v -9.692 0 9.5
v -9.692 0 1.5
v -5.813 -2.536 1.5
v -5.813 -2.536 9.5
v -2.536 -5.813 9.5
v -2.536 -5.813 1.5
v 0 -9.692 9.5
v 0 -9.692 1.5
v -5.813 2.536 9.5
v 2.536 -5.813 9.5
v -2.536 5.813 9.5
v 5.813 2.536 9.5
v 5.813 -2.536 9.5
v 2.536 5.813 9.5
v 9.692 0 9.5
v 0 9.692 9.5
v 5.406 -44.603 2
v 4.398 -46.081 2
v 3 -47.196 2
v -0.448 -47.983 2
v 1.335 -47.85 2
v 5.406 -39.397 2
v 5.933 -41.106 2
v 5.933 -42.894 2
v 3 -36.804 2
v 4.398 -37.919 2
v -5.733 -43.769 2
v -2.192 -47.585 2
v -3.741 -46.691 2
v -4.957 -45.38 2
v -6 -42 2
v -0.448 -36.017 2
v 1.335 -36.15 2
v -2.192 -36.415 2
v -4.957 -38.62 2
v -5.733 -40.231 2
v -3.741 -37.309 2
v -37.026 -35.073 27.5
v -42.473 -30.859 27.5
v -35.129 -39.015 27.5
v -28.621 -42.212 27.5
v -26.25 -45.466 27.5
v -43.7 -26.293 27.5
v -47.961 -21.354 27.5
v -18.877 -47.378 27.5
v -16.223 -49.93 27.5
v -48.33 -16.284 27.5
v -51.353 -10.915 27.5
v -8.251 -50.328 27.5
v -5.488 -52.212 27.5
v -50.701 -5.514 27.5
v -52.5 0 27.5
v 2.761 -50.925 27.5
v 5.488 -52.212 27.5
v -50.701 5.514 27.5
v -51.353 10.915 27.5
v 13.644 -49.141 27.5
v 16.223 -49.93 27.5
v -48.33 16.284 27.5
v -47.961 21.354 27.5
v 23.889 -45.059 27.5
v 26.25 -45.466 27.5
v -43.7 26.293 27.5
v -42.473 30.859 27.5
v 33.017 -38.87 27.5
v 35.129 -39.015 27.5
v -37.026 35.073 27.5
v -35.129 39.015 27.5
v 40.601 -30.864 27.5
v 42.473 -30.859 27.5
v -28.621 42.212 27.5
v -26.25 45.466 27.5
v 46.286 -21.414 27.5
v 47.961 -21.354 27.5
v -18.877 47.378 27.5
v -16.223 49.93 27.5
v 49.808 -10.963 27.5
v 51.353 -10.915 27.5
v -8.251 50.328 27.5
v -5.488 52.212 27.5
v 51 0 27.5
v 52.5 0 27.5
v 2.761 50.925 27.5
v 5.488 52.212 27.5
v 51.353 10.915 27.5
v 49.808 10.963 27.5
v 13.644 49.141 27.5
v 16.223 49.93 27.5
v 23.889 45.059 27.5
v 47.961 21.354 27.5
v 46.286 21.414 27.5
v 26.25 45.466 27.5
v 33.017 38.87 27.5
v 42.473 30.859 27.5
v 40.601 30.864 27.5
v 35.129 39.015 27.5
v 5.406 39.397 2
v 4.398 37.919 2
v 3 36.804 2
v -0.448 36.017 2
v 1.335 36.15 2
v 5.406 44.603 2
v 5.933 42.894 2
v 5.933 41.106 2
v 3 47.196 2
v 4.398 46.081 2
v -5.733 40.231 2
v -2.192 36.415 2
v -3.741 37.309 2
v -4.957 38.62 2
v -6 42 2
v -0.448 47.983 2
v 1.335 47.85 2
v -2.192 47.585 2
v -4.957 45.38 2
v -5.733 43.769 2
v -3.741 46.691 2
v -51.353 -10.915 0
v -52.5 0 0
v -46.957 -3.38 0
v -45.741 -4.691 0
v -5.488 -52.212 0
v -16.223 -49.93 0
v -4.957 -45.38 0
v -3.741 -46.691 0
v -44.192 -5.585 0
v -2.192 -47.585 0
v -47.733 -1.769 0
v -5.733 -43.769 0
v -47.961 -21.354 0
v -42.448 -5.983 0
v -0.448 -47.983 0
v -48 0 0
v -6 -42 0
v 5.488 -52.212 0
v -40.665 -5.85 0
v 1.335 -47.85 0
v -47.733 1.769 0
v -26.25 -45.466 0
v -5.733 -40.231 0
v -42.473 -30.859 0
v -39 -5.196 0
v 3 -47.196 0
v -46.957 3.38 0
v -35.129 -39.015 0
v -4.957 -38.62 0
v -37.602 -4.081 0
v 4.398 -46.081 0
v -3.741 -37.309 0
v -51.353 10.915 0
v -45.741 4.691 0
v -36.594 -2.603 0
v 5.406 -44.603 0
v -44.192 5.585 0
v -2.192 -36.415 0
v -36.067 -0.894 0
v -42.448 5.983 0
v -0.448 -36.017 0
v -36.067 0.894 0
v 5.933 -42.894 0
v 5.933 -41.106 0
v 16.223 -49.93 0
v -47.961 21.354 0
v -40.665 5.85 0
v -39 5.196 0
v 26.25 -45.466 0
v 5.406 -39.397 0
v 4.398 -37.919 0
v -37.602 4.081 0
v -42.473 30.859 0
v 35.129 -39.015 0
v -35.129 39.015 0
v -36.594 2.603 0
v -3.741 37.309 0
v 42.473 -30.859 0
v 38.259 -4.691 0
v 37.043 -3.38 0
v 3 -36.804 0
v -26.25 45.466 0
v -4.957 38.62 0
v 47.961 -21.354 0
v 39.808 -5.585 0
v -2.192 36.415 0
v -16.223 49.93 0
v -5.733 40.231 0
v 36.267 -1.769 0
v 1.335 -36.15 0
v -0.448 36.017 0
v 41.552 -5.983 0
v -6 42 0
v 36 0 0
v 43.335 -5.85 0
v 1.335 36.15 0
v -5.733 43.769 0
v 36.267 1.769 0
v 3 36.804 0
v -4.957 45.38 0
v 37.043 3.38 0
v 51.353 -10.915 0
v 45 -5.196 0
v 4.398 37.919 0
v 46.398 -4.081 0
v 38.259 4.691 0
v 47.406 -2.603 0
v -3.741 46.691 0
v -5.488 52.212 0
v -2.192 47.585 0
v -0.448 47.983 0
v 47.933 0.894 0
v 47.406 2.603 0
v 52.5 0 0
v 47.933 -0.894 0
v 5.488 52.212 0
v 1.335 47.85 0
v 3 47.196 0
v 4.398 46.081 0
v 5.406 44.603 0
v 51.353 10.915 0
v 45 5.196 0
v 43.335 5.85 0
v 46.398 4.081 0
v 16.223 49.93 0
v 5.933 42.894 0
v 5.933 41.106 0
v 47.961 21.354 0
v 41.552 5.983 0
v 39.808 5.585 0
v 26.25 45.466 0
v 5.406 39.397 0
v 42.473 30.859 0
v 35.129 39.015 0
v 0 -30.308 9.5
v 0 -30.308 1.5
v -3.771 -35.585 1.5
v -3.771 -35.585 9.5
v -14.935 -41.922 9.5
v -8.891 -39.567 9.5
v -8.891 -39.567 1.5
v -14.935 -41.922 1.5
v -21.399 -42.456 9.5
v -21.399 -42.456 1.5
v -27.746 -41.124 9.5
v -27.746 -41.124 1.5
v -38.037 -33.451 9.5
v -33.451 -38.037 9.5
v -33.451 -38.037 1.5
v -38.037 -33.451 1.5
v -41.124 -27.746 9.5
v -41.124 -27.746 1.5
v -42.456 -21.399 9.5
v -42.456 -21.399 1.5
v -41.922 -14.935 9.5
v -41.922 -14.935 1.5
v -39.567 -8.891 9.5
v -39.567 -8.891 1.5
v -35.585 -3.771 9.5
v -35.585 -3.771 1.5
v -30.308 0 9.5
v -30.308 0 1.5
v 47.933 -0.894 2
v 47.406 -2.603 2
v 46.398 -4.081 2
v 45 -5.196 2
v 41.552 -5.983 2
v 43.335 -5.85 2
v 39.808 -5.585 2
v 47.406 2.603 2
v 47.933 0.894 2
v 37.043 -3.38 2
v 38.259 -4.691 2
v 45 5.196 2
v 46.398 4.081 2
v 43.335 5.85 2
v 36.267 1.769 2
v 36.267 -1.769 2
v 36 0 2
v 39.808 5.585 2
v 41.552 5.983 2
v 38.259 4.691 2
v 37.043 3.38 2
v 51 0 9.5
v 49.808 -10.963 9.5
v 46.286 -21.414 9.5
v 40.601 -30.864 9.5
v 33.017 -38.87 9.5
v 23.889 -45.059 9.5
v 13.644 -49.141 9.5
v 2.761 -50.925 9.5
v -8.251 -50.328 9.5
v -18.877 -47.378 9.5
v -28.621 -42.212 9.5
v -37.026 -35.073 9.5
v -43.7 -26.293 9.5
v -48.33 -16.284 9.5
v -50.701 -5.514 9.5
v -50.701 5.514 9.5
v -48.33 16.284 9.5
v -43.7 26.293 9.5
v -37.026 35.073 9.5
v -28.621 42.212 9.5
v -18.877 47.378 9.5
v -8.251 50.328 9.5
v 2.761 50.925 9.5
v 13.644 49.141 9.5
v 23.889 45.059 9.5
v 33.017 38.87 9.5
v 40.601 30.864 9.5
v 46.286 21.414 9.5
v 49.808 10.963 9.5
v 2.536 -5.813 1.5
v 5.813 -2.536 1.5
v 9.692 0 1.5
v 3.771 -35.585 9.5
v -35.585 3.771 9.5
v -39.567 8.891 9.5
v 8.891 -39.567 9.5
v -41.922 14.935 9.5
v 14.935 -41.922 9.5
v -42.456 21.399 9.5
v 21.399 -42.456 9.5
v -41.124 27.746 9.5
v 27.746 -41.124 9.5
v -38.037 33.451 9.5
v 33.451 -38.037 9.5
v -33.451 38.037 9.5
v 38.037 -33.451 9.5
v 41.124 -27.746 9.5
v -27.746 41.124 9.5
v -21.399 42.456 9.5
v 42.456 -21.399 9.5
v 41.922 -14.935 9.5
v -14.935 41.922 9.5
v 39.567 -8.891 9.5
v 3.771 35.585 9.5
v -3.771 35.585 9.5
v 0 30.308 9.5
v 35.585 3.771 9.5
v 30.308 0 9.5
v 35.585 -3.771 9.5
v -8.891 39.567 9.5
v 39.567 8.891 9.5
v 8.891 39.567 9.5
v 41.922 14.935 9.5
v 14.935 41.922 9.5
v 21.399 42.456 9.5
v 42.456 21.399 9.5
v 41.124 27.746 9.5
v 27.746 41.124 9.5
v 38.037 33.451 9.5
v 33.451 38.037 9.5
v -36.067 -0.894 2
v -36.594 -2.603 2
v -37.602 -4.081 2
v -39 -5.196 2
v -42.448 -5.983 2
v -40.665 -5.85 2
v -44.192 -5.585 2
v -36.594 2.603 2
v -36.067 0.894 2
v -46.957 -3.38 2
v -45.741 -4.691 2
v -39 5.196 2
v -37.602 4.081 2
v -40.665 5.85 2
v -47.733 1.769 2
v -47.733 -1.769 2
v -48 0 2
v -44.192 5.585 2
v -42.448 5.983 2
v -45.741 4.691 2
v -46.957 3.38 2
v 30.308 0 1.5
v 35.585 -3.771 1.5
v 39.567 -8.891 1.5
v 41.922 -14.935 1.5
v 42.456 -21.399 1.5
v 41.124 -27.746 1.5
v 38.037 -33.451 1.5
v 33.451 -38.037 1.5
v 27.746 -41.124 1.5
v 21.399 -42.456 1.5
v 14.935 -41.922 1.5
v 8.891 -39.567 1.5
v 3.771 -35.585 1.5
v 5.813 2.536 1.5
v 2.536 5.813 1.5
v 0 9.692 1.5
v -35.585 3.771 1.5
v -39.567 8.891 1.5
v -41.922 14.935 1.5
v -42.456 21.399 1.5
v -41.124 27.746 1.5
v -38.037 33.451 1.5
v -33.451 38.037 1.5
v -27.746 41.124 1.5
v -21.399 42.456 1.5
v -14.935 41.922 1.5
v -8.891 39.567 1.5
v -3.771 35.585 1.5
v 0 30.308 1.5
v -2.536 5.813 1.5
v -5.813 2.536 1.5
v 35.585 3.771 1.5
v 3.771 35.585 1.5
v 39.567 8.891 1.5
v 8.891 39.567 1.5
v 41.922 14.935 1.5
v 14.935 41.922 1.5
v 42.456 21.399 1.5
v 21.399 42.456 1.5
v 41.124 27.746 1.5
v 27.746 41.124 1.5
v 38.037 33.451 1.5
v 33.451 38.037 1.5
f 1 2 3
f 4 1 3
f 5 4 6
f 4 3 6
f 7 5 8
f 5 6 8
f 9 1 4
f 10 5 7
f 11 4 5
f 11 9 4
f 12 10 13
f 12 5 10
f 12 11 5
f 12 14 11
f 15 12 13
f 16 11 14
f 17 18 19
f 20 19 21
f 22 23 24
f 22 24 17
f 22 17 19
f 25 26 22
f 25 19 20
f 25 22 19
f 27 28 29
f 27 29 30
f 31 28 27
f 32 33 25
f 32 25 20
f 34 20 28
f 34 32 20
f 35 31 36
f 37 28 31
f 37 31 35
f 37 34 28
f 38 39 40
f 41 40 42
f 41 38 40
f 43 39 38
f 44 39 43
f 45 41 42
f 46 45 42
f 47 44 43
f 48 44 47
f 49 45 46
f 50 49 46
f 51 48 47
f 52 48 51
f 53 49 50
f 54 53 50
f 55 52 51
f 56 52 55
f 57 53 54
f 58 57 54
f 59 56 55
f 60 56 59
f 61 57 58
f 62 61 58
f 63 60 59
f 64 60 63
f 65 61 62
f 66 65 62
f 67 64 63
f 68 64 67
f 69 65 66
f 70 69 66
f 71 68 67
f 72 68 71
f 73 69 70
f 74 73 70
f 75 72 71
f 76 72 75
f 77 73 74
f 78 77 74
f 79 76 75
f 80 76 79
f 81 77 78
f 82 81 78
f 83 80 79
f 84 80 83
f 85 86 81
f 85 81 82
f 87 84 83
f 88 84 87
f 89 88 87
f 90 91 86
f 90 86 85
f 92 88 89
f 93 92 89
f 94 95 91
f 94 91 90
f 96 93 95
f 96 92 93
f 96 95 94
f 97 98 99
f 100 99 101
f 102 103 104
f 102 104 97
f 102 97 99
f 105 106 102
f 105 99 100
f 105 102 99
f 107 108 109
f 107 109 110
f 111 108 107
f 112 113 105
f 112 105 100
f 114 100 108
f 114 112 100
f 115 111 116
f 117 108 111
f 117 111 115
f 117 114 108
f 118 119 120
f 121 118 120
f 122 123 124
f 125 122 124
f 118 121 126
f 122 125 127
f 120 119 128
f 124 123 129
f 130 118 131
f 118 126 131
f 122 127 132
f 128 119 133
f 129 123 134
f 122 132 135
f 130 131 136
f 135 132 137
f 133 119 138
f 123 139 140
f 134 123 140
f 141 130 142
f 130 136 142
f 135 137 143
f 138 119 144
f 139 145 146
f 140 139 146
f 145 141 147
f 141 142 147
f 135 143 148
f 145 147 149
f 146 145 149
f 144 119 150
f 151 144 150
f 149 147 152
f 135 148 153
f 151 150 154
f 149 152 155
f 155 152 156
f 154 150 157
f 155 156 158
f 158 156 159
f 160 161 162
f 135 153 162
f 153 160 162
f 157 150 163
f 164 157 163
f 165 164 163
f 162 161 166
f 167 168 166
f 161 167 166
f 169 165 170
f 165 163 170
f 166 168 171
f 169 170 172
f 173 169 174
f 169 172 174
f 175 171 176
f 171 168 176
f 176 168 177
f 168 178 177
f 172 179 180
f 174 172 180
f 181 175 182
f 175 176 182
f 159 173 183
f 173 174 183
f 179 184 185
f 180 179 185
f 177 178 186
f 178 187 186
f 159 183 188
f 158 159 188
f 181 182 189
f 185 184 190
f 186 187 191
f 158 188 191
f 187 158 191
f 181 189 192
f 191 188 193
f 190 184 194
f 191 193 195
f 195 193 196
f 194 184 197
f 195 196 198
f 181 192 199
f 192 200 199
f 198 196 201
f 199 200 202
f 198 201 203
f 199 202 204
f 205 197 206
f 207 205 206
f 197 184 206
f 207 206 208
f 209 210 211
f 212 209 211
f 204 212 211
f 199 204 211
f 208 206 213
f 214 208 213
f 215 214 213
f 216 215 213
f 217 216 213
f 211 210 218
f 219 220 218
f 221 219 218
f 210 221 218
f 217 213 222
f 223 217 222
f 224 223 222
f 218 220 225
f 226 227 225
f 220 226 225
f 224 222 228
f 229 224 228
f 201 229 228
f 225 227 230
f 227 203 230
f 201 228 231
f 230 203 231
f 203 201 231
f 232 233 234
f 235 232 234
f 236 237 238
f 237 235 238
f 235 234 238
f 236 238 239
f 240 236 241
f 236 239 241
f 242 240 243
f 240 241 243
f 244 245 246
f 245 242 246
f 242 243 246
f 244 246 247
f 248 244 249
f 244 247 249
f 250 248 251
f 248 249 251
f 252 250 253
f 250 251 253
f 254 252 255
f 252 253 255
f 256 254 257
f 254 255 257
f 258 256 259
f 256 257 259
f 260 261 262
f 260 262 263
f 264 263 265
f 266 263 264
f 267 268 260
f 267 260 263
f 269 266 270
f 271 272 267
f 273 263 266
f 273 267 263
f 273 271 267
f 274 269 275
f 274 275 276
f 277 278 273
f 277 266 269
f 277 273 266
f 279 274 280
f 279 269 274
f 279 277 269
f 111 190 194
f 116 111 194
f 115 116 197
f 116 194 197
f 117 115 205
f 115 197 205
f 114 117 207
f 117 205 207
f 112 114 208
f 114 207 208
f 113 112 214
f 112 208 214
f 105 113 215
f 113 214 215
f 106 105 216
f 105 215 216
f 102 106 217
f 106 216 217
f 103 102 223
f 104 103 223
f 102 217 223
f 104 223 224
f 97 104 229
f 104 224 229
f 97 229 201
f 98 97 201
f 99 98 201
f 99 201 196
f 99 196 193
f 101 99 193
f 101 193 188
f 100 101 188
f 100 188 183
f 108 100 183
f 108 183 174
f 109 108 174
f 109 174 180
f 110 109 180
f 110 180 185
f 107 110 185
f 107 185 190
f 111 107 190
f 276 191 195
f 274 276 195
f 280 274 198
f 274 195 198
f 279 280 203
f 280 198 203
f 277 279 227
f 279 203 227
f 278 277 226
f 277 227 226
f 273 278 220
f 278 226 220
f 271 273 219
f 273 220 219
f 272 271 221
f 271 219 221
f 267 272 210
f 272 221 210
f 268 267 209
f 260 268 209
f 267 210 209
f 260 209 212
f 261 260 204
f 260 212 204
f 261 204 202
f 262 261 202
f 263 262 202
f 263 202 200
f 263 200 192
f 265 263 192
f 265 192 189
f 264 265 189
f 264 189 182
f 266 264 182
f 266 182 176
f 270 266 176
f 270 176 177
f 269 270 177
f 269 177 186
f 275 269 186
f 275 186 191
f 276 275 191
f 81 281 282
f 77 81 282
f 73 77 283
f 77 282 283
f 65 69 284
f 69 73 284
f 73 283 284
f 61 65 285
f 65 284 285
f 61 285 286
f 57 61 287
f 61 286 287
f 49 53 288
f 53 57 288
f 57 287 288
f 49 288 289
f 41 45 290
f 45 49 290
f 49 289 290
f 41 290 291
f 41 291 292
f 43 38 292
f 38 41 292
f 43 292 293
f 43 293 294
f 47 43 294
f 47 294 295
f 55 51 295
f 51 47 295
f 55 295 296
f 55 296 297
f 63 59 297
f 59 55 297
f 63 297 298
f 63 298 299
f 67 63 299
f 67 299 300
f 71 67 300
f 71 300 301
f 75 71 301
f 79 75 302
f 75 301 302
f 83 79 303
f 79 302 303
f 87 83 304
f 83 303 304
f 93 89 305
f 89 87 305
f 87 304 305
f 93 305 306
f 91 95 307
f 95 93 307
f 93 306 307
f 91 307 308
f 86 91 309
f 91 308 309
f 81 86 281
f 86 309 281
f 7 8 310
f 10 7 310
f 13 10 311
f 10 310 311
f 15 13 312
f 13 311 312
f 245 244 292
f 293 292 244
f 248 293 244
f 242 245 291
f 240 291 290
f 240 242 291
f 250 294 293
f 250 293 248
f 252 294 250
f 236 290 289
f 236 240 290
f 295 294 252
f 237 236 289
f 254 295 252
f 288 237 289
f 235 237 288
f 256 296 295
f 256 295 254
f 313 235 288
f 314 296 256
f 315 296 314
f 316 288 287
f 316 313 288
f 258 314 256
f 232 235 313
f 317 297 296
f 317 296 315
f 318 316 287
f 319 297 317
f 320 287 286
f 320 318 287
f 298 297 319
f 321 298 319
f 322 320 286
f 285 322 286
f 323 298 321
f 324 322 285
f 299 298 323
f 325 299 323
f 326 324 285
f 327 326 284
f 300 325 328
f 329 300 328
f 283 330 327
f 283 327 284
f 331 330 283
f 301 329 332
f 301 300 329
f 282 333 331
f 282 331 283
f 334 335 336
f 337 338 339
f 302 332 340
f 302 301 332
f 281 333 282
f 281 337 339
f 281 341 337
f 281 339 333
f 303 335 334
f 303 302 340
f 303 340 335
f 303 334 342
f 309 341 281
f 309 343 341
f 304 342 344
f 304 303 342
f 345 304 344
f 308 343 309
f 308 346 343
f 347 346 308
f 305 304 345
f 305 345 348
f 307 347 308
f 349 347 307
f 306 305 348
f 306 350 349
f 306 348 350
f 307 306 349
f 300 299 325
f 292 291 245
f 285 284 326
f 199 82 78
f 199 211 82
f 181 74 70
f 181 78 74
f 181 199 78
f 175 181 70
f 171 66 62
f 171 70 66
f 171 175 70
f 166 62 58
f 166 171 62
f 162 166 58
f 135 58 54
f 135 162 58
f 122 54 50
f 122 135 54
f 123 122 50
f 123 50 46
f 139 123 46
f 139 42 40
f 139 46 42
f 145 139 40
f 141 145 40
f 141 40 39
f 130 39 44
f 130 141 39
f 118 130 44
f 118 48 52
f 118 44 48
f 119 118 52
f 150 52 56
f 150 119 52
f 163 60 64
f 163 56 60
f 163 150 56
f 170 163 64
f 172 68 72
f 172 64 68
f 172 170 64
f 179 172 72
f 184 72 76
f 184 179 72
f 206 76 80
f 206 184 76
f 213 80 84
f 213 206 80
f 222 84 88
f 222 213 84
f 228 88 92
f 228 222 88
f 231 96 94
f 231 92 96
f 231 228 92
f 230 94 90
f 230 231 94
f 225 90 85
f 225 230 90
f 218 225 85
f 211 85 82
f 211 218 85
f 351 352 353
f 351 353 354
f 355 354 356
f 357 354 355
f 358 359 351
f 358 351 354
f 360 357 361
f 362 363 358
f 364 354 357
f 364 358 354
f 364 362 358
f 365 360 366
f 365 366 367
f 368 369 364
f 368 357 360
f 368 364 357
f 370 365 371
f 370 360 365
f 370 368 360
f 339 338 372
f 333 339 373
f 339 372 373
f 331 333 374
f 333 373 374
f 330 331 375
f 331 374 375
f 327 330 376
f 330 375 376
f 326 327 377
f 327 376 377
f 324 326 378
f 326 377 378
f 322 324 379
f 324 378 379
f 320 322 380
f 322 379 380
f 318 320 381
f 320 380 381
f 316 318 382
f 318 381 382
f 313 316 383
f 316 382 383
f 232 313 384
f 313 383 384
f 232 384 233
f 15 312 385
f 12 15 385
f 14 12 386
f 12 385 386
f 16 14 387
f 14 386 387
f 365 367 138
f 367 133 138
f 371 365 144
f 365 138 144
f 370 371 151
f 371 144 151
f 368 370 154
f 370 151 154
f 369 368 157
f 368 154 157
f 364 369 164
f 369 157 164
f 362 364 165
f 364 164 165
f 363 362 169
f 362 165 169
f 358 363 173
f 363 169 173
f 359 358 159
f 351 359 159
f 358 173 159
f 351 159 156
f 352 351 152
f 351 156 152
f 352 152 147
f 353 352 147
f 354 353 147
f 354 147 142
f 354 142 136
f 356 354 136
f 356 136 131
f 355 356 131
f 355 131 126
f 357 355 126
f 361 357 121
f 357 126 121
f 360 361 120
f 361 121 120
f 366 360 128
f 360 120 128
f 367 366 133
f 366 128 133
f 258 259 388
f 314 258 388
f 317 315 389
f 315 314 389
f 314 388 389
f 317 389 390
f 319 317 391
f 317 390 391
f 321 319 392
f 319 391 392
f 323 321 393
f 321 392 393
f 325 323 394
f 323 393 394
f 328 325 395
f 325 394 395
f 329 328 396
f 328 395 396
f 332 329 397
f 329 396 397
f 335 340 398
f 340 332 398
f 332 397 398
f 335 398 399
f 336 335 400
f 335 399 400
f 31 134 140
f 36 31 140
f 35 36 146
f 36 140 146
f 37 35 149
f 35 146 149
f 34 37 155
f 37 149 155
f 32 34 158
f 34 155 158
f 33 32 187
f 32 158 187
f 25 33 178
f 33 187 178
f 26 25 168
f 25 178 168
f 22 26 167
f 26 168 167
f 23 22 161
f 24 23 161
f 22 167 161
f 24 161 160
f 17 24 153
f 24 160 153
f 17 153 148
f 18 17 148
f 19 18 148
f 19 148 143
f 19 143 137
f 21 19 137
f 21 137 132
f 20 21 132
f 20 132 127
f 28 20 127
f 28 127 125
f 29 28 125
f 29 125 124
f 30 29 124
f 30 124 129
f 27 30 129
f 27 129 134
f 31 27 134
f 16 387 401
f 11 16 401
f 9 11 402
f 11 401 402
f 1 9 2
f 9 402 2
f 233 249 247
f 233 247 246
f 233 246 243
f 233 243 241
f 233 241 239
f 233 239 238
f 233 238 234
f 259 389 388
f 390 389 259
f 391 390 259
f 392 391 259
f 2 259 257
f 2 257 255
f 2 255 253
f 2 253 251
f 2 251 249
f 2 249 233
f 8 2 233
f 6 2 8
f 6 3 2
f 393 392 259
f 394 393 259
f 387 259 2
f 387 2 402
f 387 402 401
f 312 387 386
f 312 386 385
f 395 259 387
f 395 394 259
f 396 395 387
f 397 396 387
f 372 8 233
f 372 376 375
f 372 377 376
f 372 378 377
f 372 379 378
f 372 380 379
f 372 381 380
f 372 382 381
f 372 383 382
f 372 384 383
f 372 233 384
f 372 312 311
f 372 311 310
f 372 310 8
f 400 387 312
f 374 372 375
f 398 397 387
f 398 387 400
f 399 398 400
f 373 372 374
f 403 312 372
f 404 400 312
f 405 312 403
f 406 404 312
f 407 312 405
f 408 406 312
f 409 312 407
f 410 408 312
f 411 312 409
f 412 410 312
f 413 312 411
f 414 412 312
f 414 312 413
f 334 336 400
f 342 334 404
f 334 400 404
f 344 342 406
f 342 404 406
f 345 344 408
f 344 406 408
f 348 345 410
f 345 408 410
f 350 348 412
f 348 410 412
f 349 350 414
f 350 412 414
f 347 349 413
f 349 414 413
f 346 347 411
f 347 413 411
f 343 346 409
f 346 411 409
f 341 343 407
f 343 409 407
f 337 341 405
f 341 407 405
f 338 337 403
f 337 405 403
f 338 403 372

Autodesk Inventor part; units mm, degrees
ref_plane "YZ Plane" through (0, 0, 0) normal (1, 0, 0) x (0, 1, 0)
ref_plane "XZ Plane" through (0, 0, 0) normal (0, 1, 0) x (-1, 0, 0)
ref_plane "XY Plane" through (0, 0, 0) normal (0, 0, 1) x (1, 0, 0)
sketch "Sketch1" plane through (0, 0, 0) normal (0, 0, 1) x (1, 0, 0)
  circle A0 centre (0, 0) radius 50 construction
  circle A1 centre (0, 0) radius 52.5
  dimension "d0" = 100
  dimension "d1" = 105
extrude "Extrusion1" add sketch "Sketch1" along normal blind 1.5
sketch "Sketch2" plane through (0, 0, 1.5) normal (0, 0, 1) x (1, 0, 0)
  line L0 (-20, -20) -> (20, -20) construction
  line L1 (20, -20) -> (20, 20) construction
  line L2 (20, 20) -> (-20, 20) construction
  line L3 (-20, 20) -> (-20, -20) construction
  line L4 (-20, -20) -> (20, 20) construction
  line L5 (20, -20) -> (-20, 20) construction
  circle A0 centre (-20, 20) radius 22.5
  circle A1 centre (20, 20) radius 22.5
  circle A2 centre (20, -20) radius 22.5
  circle A3 centre (-20, -20) radius 22.5
  circle A4 centre (0, 0) radius 52.5 projected
  point P0 (-9.6922, 0)
  point P1 (0, -9.6922)
  point P2 (9.6922, 0)
  point P3 (0, 9.6922)
  point P4 (0, -30.3078)
  point P5 (-30.3078, 0)
  point P6 (0, 30.3078)
  point P7 (30.3078, 0)
  dimension "d4" = 45
  dimension "d5" = 40
extrude "Extrusion2" add sketch "Sketch2" along normal blind 8 contours A1 A2 A3 A0 | A4
sketch "Sketch3" plane through (0, 0, 9.5) normal (0, 0, 1) x (1, 0, 0)
  circle A0 centre (0, 0) radius 51
  circle A1 centre (0, 0) radius 52.5 projected
  dimension "d8" = 1.5
extrude "Extrusion3" add sketch "Sketch3" along normal blind 18
sketch "Sketch4" plane through (0, 0, 0) normal (0, 0, -1) x (-1, 0, 0)
  line L0 (0, 0) -> (42, 0) construction
  circle A0 centre (42, 0) radius 6
  circle A1 centre (0, 42) radius 6
  circle A2 centre (-42, 0) radius 6
  circle A3 centre (0, -42) radius 6
  dimension "d11" = 12
  dimension "d12" = 42
  dimension "d15" = 360
extrude "Extrusion4" cut sketch "Sketch4" against normal blind 2
properties part number "Base"
